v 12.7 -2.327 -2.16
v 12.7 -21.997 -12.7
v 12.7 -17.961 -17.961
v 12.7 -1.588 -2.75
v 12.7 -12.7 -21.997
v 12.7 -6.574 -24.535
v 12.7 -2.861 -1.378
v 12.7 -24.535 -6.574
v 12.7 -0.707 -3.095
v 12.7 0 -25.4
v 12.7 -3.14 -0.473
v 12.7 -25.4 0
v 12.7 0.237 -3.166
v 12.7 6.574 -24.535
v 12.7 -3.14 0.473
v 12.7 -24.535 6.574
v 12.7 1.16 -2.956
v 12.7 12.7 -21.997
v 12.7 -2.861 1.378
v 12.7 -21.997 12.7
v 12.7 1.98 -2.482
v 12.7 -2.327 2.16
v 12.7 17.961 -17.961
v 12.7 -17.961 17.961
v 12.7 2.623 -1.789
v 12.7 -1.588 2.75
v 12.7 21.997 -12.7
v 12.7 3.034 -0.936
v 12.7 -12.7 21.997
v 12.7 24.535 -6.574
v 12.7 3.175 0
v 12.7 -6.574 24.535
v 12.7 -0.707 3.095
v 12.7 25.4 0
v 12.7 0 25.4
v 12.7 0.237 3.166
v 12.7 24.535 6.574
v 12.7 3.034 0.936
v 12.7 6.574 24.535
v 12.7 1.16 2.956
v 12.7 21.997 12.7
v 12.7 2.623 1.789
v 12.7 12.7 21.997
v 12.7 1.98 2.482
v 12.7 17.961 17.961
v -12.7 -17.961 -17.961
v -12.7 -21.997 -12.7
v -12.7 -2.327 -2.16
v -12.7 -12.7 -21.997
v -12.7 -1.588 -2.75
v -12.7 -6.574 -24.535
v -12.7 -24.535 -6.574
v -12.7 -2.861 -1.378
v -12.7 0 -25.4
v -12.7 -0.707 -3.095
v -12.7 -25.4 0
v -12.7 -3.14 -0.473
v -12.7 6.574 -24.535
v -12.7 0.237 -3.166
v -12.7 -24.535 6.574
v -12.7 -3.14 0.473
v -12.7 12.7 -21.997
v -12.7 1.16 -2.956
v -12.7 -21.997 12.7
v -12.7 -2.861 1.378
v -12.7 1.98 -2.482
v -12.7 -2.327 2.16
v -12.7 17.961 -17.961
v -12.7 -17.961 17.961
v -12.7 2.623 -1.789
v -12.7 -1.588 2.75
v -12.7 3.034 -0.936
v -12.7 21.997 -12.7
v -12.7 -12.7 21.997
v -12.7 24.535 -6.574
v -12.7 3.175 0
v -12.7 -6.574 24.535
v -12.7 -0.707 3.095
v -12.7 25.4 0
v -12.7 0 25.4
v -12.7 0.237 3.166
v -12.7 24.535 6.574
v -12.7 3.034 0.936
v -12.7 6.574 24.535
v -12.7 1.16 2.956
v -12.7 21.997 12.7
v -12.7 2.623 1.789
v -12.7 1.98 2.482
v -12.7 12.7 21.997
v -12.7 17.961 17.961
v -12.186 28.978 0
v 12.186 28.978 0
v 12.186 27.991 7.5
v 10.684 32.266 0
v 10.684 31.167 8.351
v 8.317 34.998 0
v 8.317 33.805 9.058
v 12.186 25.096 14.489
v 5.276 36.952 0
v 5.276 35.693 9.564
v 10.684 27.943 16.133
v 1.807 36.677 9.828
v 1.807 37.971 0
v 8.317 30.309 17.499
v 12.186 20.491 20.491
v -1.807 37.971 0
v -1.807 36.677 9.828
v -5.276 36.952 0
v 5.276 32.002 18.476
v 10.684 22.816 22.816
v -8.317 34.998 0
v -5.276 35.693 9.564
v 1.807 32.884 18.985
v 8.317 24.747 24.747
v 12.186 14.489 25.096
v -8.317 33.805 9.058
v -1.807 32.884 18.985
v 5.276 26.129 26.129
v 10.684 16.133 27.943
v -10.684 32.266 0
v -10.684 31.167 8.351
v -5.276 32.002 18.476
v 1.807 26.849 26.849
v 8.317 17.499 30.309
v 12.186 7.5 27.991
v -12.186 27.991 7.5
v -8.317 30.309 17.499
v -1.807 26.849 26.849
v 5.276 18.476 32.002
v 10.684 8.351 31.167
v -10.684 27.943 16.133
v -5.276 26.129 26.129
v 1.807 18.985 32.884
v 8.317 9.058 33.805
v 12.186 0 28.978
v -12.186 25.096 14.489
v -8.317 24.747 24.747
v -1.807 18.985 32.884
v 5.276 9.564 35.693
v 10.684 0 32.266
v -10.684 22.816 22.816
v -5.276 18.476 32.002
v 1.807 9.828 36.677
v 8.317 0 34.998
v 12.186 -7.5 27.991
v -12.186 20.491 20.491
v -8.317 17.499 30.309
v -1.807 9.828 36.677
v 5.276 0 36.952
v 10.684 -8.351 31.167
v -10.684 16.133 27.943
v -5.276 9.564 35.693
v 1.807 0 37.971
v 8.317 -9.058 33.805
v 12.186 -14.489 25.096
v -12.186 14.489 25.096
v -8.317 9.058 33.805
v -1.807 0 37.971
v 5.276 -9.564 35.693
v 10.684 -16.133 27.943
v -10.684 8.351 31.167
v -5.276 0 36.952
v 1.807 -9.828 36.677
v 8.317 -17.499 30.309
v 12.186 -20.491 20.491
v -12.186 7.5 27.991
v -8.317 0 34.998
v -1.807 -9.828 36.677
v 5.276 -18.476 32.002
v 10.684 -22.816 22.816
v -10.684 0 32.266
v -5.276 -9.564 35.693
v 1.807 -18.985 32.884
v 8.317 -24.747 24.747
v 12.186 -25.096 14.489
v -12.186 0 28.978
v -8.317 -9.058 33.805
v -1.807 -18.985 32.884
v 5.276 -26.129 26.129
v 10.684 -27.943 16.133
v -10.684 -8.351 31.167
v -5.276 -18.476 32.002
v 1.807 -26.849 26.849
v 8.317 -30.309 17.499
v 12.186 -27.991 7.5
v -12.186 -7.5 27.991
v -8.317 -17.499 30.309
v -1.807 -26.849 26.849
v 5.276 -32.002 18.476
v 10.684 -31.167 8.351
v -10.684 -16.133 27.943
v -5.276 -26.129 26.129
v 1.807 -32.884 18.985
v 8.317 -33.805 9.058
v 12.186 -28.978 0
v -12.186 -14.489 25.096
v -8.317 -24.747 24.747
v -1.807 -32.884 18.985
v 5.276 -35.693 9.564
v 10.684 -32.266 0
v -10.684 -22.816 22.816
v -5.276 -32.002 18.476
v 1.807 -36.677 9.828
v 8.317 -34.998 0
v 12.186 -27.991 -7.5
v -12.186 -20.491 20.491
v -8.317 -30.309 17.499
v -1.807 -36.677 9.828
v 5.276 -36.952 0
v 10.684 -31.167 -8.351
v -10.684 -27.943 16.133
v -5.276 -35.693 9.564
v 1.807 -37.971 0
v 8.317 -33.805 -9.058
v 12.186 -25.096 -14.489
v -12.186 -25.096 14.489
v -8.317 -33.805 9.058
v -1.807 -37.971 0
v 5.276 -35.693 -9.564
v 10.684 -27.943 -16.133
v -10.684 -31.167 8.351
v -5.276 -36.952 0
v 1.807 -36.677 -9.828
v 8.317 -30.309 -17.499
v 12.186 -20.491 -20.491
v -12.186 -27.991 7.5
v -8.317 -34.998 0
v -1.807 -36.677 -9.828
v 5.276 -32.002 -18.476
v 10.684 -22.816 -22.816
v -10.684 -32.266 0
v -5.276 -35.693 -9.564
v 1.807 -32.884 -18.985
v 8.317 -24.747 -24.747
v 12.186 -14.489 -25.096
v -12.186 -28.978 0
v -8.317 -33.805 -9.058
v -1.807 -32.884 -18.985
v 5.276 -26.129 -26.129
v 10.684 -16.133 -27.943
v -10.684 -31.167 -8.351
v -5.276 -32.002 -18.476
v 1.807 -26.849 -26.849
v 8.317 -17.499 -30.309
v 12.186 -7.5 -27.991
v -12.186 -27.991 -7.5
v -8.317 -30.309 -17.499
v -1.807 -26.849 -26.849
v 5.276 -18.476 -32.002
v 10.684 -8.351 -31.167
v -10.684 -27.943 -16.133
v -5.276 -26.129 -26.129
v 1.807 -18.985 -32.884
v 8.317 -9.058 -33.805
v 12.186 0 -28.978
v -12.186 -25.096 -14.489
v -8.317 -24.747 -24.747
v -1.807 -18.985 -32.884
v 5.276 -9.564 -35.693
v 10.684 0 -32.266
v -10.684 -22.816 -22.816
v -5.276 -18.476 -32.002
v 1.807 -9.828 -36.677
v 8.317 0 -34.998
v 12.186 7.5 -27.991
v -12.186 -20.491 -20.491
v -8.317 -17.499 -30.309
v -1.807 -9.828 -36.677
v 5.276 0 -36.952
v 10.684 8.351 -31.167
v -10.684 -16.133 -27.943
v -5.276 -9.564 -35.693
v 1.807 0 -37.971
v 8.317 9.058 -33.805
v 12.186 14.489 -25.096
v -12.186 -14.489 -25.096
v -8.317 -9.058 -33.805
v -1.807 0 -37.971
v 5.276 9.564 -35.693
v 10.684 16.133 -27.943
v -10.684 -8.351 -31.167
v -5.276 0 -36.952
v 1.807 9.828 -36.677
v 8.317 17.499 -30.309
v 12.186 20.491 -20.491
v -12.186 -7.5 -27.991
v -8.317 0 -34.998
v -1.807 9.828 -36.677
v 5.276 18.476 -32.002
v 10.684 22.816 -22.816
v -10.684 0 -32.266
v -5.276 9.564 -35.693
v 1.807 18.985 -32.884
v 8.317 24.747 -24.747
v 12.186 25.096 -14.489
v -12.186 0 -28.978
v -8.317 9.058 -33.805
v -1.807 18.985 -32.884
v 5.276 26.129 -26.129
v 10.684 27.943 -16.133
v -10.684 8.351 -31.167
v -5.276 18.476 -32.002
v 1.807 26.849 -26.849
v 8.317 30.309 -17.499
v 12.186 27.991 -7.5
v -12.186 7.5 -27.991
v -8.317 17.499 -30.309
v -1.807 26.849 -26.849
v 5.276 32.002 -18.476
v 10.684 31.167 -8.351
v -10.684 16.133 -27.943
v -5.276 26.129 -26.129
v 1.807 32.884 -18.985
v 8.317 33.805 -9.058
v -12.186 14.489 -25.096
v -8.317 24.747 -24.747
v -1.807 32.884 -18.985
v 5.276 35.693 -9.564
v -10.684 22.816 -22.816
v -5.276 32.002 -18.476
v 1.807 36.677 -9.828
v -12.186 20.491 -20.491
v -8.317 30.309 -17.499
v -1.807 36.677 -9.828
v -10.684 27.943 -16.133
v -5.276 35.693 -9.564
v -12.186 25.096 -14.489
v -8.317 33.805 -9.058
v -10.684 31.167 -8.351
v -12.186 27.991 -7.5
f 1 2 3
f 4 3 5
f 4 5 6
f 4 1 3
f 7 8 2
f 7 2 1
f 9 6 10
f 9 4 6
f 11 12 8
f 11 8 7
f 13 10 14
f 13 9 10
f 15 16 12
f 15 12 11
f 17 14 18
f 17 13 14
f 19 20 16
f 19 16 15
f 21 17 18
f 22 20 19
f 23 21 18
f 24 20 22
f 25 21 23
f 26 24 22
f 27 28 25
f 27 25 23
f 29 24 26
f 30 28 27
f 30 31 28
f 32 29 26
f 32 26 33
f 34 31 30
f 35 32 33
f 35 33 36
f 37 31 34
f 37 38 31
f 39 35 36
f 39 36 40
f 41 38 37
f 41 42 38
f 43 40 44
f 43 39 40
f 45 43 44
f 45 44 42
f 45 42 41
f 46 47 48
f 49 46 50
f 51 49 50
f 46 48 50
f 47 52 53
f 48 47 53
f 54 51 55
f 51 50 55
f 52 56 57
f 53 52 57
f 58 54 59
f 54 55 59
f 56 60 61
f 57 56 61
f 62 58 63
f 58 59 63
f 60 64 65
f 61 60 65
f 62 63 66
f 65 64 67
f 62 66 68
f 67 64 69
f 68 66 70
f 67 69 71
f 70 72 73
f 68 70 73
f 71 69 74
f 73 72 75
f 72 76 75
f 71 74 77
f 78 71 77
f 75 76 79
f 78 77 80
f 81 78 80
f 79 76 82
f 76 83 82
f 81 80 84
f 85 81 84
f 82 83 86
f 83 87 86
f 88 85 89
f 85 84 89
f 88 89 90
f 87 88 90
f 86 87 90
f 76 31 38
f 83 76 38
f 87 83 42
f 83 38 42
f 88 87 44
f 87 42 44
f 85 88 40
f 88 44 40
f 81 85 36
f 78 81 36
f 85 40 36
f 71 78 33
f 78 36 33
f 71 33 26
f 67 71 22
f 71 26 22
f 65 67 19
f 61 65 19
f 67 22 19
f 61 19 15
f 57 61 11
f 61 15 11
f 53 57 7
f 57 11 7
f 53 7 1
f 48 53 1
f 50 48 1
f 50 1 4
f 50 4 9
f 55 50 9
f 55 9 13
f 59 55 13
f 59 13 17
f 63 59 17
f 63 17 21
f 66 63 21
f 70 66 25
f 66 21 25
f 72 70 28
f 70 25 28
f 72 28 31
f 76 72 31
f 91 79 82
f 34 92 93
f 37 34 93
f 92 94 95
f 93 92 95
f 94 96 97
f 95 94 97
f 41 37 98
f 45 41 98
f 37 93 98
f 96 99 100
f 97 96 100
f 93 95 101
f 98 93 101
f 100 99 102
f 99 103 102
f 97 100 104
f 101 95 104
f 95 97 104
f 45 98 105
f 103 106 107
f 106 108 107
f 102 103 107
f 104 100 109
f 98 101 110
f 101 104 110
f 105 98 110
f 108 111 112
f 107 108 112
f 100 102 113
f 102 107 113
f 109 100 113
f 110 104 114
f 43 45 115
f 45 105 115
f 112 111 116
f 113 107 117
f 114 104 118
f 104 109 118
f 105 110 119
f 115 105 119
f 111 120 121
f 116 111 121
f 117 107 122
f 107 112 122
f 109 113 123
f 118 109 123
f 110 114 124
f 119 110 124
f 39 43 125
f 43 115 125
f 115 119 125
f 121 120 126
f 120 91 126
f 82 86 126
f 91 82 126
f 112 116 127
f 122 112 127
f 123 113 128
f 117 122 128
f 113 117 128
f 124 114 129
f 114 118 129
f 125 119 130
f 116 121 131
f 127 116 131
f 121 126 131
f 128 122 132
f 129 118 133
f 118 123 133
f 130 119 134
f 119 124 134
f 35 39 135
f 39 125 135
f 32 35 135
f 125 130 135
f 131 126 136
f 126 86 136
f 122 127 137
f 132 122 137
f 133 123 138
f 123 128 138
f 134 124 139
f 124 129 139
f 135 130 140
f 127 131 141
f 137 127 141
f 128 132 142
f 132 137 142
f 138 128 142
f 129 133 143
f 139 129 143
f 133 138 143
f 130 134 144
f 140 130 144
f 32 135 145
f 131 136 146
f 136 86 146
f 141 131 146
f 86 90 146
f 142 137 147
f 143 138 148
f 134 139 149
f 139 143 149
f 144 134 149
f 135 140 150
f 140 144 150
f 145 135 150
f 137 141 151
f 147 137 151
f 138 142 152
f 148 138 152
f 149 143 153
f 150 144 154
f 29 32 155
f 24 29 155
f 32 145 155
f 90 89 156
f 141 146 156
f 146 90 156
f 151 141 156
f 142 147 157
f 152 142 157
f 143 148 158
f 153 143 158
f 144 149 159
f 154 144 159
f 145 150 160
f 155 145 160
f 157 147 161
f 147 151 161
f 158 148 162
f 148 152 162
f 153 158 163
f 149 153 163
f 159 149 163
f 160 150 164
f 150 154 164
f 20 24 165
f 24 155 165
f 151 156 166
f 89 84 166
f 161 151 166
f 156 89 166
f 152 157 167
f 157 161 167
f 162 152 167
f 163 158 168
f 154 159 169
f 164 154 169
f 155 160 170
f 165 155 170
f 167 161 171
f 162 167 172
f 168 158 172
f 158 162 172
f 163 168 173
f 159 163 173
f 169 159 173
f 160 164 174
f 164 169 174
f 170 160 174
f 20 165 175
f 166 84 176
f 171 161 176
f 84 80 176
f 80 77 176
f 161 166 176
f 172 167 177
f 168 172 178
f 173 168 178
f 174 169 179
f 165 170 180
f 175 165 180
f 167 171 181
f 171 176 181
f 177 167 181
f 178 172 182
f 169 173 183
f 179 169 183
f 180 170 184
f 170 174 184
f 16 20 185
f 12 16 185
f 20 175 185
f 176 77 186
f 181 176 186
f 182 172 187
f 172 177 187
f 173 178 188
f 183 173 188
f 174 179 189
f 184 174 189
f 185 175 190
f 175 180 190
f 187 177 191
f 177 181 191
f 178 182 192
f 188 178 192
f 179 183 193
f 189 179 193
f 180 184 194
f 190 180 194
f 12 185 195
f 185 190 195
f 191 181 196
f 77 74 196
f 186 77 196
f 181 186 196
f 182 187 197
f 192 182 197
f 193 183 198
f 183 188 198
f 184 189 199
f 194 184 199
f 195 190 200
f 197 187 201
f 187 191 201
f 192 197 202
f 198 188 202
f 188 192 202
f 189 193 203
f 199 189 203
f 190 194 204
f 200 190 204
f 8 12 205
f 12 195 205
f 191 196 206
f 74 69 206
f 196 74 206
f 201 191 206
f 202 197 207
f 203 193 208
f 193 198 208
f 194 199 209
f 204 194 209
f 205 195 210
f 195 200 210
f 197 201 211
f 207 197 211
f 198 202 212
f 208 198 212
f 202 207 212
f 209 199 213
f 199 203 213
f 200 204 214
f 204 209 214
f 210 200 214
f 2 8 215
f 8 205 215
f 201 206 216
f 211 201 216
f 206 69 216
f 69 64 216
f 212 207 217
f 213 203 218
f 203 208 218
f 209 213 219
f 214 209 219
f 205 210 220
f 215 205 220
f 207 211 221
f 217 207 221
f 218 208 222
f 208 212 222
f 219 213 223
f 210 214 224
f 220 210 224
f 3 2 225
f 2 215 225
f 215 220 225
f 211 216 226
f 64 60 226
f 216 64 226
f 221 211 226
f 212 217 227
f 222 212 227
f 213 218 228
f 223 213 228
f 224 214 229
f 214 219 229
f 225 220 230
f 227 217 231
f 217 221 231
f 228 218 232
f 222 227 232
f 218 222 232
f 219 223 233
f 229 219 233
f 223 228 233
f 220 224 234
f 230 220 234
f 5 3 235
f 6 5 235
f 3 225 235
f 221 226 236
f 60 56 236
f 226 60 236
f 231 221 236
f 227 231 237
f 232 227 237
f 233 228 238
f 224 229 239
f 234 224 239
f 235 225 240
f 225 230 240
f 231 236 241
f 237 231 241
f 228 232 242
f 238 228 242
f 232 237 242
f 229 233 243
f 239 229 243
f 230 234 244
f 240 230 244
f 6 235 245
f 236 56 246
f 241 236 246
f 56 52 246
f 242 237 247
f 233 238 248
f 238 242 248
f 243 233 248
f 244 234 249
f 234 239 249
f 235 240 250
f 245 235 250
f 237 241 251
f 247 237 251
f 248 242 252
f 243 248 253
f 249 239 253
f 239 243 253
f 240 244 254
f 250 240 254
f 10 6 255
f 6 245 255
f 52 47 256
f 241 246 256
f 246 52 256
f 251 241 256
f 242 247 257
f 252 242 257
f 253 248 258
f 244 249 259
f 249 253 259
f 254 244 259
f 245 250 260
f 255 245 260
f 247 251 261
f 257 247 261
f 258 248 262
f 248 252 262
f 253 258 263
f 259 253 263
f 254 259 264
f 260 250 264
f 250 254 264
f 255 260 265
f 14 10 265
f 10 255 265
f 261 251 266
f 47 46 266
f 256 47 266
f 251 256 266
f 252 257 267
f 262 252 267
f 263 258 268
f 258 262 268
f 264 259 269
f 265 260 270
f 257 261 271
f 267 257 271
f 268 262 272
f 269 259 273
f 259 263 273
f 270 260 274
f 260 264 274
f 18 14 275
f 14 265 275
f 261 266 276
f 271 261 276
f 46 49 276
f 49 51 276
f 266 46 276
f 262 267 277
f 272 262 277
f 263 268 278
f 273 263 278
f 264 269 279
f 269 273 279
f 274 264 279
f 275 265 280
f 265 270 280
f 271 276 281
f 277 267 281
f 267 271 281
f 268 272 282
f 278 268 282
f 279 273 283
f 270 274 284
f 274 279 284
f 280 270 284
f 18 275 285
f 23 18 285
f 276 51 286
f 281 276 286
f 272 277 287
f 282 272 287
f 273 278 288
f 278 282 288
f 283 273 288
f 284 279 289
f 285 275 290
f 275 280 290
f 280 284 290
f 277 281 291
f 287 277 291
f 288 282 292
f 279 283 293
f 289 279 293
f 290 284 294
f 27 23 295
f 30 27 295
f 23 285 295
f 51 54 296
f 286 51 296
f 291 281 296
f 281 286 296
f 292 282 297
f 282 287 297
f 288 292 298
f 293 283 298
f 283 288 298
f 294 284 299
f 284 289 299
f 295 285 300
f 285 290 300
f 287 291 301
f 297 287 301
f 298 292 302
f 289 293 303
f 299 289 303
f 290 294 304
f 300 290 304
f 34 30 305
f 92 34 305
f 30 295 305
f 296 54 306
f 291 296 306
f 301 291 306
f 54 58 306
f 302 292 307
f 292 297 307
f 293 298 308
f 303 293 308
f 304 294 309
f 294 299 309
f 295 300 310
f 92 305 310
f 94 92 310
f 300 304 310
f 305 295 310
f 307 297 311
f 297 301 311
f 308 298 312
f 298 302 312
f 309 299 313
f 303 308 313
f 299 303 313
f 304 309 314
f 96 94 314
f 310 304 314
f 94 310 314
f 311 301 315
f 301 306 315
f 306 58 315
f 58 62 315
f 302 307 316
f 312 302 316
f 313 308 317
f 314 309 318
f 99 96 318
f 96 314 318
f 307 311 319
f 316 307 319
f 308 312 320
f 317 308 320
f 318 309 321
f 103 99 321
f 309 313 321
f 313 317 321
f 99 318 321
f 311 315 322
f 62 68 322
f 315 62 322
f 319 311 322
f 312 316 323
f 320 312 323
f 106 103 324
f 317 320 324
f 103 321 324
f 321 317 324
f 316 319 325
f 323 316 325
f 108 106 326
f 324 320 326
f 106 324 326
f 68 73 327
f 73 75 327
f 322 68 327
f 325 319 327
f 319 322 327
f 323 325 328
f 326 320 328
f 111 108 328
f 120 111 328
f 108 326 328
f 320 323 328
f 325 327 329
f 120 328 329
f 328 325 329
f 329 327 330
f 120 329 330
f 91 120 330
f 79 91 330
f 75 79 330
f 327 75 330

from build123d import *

# Parameters (mm, degrees)
F0_R     = 12.7
F2_R     = 25.4
F3_DEPTH = 12.7
F4_R     = 3.175
F5_DEPTH = 25.4


with BuildPart() as f1:
    # F0 (on Top) → F1 (revolve)
    with BuildSketch(Plane.XY):
        with Locations((0, 25.4)):
            Circle(F0_R)
    revolve(axis=Axis((2.317362465, 0, 0), (1, 0, 0)))

    # F2 (on Right) → F3 (join, symmetric)
    with BuildSketch(Plane.YZ):
        Circle(F2_R)
    extrude(amount=F3_DEPTH, both=True)

    # F4 (on face) → F5 (cut)
    with BuildSketch(Plane.YZ.offset(12.7)):
        Circle(F4_R)
    extrude(amount=-F5_DEPTH, mode=Mode.SUBTRACT)


solid = f1.part
